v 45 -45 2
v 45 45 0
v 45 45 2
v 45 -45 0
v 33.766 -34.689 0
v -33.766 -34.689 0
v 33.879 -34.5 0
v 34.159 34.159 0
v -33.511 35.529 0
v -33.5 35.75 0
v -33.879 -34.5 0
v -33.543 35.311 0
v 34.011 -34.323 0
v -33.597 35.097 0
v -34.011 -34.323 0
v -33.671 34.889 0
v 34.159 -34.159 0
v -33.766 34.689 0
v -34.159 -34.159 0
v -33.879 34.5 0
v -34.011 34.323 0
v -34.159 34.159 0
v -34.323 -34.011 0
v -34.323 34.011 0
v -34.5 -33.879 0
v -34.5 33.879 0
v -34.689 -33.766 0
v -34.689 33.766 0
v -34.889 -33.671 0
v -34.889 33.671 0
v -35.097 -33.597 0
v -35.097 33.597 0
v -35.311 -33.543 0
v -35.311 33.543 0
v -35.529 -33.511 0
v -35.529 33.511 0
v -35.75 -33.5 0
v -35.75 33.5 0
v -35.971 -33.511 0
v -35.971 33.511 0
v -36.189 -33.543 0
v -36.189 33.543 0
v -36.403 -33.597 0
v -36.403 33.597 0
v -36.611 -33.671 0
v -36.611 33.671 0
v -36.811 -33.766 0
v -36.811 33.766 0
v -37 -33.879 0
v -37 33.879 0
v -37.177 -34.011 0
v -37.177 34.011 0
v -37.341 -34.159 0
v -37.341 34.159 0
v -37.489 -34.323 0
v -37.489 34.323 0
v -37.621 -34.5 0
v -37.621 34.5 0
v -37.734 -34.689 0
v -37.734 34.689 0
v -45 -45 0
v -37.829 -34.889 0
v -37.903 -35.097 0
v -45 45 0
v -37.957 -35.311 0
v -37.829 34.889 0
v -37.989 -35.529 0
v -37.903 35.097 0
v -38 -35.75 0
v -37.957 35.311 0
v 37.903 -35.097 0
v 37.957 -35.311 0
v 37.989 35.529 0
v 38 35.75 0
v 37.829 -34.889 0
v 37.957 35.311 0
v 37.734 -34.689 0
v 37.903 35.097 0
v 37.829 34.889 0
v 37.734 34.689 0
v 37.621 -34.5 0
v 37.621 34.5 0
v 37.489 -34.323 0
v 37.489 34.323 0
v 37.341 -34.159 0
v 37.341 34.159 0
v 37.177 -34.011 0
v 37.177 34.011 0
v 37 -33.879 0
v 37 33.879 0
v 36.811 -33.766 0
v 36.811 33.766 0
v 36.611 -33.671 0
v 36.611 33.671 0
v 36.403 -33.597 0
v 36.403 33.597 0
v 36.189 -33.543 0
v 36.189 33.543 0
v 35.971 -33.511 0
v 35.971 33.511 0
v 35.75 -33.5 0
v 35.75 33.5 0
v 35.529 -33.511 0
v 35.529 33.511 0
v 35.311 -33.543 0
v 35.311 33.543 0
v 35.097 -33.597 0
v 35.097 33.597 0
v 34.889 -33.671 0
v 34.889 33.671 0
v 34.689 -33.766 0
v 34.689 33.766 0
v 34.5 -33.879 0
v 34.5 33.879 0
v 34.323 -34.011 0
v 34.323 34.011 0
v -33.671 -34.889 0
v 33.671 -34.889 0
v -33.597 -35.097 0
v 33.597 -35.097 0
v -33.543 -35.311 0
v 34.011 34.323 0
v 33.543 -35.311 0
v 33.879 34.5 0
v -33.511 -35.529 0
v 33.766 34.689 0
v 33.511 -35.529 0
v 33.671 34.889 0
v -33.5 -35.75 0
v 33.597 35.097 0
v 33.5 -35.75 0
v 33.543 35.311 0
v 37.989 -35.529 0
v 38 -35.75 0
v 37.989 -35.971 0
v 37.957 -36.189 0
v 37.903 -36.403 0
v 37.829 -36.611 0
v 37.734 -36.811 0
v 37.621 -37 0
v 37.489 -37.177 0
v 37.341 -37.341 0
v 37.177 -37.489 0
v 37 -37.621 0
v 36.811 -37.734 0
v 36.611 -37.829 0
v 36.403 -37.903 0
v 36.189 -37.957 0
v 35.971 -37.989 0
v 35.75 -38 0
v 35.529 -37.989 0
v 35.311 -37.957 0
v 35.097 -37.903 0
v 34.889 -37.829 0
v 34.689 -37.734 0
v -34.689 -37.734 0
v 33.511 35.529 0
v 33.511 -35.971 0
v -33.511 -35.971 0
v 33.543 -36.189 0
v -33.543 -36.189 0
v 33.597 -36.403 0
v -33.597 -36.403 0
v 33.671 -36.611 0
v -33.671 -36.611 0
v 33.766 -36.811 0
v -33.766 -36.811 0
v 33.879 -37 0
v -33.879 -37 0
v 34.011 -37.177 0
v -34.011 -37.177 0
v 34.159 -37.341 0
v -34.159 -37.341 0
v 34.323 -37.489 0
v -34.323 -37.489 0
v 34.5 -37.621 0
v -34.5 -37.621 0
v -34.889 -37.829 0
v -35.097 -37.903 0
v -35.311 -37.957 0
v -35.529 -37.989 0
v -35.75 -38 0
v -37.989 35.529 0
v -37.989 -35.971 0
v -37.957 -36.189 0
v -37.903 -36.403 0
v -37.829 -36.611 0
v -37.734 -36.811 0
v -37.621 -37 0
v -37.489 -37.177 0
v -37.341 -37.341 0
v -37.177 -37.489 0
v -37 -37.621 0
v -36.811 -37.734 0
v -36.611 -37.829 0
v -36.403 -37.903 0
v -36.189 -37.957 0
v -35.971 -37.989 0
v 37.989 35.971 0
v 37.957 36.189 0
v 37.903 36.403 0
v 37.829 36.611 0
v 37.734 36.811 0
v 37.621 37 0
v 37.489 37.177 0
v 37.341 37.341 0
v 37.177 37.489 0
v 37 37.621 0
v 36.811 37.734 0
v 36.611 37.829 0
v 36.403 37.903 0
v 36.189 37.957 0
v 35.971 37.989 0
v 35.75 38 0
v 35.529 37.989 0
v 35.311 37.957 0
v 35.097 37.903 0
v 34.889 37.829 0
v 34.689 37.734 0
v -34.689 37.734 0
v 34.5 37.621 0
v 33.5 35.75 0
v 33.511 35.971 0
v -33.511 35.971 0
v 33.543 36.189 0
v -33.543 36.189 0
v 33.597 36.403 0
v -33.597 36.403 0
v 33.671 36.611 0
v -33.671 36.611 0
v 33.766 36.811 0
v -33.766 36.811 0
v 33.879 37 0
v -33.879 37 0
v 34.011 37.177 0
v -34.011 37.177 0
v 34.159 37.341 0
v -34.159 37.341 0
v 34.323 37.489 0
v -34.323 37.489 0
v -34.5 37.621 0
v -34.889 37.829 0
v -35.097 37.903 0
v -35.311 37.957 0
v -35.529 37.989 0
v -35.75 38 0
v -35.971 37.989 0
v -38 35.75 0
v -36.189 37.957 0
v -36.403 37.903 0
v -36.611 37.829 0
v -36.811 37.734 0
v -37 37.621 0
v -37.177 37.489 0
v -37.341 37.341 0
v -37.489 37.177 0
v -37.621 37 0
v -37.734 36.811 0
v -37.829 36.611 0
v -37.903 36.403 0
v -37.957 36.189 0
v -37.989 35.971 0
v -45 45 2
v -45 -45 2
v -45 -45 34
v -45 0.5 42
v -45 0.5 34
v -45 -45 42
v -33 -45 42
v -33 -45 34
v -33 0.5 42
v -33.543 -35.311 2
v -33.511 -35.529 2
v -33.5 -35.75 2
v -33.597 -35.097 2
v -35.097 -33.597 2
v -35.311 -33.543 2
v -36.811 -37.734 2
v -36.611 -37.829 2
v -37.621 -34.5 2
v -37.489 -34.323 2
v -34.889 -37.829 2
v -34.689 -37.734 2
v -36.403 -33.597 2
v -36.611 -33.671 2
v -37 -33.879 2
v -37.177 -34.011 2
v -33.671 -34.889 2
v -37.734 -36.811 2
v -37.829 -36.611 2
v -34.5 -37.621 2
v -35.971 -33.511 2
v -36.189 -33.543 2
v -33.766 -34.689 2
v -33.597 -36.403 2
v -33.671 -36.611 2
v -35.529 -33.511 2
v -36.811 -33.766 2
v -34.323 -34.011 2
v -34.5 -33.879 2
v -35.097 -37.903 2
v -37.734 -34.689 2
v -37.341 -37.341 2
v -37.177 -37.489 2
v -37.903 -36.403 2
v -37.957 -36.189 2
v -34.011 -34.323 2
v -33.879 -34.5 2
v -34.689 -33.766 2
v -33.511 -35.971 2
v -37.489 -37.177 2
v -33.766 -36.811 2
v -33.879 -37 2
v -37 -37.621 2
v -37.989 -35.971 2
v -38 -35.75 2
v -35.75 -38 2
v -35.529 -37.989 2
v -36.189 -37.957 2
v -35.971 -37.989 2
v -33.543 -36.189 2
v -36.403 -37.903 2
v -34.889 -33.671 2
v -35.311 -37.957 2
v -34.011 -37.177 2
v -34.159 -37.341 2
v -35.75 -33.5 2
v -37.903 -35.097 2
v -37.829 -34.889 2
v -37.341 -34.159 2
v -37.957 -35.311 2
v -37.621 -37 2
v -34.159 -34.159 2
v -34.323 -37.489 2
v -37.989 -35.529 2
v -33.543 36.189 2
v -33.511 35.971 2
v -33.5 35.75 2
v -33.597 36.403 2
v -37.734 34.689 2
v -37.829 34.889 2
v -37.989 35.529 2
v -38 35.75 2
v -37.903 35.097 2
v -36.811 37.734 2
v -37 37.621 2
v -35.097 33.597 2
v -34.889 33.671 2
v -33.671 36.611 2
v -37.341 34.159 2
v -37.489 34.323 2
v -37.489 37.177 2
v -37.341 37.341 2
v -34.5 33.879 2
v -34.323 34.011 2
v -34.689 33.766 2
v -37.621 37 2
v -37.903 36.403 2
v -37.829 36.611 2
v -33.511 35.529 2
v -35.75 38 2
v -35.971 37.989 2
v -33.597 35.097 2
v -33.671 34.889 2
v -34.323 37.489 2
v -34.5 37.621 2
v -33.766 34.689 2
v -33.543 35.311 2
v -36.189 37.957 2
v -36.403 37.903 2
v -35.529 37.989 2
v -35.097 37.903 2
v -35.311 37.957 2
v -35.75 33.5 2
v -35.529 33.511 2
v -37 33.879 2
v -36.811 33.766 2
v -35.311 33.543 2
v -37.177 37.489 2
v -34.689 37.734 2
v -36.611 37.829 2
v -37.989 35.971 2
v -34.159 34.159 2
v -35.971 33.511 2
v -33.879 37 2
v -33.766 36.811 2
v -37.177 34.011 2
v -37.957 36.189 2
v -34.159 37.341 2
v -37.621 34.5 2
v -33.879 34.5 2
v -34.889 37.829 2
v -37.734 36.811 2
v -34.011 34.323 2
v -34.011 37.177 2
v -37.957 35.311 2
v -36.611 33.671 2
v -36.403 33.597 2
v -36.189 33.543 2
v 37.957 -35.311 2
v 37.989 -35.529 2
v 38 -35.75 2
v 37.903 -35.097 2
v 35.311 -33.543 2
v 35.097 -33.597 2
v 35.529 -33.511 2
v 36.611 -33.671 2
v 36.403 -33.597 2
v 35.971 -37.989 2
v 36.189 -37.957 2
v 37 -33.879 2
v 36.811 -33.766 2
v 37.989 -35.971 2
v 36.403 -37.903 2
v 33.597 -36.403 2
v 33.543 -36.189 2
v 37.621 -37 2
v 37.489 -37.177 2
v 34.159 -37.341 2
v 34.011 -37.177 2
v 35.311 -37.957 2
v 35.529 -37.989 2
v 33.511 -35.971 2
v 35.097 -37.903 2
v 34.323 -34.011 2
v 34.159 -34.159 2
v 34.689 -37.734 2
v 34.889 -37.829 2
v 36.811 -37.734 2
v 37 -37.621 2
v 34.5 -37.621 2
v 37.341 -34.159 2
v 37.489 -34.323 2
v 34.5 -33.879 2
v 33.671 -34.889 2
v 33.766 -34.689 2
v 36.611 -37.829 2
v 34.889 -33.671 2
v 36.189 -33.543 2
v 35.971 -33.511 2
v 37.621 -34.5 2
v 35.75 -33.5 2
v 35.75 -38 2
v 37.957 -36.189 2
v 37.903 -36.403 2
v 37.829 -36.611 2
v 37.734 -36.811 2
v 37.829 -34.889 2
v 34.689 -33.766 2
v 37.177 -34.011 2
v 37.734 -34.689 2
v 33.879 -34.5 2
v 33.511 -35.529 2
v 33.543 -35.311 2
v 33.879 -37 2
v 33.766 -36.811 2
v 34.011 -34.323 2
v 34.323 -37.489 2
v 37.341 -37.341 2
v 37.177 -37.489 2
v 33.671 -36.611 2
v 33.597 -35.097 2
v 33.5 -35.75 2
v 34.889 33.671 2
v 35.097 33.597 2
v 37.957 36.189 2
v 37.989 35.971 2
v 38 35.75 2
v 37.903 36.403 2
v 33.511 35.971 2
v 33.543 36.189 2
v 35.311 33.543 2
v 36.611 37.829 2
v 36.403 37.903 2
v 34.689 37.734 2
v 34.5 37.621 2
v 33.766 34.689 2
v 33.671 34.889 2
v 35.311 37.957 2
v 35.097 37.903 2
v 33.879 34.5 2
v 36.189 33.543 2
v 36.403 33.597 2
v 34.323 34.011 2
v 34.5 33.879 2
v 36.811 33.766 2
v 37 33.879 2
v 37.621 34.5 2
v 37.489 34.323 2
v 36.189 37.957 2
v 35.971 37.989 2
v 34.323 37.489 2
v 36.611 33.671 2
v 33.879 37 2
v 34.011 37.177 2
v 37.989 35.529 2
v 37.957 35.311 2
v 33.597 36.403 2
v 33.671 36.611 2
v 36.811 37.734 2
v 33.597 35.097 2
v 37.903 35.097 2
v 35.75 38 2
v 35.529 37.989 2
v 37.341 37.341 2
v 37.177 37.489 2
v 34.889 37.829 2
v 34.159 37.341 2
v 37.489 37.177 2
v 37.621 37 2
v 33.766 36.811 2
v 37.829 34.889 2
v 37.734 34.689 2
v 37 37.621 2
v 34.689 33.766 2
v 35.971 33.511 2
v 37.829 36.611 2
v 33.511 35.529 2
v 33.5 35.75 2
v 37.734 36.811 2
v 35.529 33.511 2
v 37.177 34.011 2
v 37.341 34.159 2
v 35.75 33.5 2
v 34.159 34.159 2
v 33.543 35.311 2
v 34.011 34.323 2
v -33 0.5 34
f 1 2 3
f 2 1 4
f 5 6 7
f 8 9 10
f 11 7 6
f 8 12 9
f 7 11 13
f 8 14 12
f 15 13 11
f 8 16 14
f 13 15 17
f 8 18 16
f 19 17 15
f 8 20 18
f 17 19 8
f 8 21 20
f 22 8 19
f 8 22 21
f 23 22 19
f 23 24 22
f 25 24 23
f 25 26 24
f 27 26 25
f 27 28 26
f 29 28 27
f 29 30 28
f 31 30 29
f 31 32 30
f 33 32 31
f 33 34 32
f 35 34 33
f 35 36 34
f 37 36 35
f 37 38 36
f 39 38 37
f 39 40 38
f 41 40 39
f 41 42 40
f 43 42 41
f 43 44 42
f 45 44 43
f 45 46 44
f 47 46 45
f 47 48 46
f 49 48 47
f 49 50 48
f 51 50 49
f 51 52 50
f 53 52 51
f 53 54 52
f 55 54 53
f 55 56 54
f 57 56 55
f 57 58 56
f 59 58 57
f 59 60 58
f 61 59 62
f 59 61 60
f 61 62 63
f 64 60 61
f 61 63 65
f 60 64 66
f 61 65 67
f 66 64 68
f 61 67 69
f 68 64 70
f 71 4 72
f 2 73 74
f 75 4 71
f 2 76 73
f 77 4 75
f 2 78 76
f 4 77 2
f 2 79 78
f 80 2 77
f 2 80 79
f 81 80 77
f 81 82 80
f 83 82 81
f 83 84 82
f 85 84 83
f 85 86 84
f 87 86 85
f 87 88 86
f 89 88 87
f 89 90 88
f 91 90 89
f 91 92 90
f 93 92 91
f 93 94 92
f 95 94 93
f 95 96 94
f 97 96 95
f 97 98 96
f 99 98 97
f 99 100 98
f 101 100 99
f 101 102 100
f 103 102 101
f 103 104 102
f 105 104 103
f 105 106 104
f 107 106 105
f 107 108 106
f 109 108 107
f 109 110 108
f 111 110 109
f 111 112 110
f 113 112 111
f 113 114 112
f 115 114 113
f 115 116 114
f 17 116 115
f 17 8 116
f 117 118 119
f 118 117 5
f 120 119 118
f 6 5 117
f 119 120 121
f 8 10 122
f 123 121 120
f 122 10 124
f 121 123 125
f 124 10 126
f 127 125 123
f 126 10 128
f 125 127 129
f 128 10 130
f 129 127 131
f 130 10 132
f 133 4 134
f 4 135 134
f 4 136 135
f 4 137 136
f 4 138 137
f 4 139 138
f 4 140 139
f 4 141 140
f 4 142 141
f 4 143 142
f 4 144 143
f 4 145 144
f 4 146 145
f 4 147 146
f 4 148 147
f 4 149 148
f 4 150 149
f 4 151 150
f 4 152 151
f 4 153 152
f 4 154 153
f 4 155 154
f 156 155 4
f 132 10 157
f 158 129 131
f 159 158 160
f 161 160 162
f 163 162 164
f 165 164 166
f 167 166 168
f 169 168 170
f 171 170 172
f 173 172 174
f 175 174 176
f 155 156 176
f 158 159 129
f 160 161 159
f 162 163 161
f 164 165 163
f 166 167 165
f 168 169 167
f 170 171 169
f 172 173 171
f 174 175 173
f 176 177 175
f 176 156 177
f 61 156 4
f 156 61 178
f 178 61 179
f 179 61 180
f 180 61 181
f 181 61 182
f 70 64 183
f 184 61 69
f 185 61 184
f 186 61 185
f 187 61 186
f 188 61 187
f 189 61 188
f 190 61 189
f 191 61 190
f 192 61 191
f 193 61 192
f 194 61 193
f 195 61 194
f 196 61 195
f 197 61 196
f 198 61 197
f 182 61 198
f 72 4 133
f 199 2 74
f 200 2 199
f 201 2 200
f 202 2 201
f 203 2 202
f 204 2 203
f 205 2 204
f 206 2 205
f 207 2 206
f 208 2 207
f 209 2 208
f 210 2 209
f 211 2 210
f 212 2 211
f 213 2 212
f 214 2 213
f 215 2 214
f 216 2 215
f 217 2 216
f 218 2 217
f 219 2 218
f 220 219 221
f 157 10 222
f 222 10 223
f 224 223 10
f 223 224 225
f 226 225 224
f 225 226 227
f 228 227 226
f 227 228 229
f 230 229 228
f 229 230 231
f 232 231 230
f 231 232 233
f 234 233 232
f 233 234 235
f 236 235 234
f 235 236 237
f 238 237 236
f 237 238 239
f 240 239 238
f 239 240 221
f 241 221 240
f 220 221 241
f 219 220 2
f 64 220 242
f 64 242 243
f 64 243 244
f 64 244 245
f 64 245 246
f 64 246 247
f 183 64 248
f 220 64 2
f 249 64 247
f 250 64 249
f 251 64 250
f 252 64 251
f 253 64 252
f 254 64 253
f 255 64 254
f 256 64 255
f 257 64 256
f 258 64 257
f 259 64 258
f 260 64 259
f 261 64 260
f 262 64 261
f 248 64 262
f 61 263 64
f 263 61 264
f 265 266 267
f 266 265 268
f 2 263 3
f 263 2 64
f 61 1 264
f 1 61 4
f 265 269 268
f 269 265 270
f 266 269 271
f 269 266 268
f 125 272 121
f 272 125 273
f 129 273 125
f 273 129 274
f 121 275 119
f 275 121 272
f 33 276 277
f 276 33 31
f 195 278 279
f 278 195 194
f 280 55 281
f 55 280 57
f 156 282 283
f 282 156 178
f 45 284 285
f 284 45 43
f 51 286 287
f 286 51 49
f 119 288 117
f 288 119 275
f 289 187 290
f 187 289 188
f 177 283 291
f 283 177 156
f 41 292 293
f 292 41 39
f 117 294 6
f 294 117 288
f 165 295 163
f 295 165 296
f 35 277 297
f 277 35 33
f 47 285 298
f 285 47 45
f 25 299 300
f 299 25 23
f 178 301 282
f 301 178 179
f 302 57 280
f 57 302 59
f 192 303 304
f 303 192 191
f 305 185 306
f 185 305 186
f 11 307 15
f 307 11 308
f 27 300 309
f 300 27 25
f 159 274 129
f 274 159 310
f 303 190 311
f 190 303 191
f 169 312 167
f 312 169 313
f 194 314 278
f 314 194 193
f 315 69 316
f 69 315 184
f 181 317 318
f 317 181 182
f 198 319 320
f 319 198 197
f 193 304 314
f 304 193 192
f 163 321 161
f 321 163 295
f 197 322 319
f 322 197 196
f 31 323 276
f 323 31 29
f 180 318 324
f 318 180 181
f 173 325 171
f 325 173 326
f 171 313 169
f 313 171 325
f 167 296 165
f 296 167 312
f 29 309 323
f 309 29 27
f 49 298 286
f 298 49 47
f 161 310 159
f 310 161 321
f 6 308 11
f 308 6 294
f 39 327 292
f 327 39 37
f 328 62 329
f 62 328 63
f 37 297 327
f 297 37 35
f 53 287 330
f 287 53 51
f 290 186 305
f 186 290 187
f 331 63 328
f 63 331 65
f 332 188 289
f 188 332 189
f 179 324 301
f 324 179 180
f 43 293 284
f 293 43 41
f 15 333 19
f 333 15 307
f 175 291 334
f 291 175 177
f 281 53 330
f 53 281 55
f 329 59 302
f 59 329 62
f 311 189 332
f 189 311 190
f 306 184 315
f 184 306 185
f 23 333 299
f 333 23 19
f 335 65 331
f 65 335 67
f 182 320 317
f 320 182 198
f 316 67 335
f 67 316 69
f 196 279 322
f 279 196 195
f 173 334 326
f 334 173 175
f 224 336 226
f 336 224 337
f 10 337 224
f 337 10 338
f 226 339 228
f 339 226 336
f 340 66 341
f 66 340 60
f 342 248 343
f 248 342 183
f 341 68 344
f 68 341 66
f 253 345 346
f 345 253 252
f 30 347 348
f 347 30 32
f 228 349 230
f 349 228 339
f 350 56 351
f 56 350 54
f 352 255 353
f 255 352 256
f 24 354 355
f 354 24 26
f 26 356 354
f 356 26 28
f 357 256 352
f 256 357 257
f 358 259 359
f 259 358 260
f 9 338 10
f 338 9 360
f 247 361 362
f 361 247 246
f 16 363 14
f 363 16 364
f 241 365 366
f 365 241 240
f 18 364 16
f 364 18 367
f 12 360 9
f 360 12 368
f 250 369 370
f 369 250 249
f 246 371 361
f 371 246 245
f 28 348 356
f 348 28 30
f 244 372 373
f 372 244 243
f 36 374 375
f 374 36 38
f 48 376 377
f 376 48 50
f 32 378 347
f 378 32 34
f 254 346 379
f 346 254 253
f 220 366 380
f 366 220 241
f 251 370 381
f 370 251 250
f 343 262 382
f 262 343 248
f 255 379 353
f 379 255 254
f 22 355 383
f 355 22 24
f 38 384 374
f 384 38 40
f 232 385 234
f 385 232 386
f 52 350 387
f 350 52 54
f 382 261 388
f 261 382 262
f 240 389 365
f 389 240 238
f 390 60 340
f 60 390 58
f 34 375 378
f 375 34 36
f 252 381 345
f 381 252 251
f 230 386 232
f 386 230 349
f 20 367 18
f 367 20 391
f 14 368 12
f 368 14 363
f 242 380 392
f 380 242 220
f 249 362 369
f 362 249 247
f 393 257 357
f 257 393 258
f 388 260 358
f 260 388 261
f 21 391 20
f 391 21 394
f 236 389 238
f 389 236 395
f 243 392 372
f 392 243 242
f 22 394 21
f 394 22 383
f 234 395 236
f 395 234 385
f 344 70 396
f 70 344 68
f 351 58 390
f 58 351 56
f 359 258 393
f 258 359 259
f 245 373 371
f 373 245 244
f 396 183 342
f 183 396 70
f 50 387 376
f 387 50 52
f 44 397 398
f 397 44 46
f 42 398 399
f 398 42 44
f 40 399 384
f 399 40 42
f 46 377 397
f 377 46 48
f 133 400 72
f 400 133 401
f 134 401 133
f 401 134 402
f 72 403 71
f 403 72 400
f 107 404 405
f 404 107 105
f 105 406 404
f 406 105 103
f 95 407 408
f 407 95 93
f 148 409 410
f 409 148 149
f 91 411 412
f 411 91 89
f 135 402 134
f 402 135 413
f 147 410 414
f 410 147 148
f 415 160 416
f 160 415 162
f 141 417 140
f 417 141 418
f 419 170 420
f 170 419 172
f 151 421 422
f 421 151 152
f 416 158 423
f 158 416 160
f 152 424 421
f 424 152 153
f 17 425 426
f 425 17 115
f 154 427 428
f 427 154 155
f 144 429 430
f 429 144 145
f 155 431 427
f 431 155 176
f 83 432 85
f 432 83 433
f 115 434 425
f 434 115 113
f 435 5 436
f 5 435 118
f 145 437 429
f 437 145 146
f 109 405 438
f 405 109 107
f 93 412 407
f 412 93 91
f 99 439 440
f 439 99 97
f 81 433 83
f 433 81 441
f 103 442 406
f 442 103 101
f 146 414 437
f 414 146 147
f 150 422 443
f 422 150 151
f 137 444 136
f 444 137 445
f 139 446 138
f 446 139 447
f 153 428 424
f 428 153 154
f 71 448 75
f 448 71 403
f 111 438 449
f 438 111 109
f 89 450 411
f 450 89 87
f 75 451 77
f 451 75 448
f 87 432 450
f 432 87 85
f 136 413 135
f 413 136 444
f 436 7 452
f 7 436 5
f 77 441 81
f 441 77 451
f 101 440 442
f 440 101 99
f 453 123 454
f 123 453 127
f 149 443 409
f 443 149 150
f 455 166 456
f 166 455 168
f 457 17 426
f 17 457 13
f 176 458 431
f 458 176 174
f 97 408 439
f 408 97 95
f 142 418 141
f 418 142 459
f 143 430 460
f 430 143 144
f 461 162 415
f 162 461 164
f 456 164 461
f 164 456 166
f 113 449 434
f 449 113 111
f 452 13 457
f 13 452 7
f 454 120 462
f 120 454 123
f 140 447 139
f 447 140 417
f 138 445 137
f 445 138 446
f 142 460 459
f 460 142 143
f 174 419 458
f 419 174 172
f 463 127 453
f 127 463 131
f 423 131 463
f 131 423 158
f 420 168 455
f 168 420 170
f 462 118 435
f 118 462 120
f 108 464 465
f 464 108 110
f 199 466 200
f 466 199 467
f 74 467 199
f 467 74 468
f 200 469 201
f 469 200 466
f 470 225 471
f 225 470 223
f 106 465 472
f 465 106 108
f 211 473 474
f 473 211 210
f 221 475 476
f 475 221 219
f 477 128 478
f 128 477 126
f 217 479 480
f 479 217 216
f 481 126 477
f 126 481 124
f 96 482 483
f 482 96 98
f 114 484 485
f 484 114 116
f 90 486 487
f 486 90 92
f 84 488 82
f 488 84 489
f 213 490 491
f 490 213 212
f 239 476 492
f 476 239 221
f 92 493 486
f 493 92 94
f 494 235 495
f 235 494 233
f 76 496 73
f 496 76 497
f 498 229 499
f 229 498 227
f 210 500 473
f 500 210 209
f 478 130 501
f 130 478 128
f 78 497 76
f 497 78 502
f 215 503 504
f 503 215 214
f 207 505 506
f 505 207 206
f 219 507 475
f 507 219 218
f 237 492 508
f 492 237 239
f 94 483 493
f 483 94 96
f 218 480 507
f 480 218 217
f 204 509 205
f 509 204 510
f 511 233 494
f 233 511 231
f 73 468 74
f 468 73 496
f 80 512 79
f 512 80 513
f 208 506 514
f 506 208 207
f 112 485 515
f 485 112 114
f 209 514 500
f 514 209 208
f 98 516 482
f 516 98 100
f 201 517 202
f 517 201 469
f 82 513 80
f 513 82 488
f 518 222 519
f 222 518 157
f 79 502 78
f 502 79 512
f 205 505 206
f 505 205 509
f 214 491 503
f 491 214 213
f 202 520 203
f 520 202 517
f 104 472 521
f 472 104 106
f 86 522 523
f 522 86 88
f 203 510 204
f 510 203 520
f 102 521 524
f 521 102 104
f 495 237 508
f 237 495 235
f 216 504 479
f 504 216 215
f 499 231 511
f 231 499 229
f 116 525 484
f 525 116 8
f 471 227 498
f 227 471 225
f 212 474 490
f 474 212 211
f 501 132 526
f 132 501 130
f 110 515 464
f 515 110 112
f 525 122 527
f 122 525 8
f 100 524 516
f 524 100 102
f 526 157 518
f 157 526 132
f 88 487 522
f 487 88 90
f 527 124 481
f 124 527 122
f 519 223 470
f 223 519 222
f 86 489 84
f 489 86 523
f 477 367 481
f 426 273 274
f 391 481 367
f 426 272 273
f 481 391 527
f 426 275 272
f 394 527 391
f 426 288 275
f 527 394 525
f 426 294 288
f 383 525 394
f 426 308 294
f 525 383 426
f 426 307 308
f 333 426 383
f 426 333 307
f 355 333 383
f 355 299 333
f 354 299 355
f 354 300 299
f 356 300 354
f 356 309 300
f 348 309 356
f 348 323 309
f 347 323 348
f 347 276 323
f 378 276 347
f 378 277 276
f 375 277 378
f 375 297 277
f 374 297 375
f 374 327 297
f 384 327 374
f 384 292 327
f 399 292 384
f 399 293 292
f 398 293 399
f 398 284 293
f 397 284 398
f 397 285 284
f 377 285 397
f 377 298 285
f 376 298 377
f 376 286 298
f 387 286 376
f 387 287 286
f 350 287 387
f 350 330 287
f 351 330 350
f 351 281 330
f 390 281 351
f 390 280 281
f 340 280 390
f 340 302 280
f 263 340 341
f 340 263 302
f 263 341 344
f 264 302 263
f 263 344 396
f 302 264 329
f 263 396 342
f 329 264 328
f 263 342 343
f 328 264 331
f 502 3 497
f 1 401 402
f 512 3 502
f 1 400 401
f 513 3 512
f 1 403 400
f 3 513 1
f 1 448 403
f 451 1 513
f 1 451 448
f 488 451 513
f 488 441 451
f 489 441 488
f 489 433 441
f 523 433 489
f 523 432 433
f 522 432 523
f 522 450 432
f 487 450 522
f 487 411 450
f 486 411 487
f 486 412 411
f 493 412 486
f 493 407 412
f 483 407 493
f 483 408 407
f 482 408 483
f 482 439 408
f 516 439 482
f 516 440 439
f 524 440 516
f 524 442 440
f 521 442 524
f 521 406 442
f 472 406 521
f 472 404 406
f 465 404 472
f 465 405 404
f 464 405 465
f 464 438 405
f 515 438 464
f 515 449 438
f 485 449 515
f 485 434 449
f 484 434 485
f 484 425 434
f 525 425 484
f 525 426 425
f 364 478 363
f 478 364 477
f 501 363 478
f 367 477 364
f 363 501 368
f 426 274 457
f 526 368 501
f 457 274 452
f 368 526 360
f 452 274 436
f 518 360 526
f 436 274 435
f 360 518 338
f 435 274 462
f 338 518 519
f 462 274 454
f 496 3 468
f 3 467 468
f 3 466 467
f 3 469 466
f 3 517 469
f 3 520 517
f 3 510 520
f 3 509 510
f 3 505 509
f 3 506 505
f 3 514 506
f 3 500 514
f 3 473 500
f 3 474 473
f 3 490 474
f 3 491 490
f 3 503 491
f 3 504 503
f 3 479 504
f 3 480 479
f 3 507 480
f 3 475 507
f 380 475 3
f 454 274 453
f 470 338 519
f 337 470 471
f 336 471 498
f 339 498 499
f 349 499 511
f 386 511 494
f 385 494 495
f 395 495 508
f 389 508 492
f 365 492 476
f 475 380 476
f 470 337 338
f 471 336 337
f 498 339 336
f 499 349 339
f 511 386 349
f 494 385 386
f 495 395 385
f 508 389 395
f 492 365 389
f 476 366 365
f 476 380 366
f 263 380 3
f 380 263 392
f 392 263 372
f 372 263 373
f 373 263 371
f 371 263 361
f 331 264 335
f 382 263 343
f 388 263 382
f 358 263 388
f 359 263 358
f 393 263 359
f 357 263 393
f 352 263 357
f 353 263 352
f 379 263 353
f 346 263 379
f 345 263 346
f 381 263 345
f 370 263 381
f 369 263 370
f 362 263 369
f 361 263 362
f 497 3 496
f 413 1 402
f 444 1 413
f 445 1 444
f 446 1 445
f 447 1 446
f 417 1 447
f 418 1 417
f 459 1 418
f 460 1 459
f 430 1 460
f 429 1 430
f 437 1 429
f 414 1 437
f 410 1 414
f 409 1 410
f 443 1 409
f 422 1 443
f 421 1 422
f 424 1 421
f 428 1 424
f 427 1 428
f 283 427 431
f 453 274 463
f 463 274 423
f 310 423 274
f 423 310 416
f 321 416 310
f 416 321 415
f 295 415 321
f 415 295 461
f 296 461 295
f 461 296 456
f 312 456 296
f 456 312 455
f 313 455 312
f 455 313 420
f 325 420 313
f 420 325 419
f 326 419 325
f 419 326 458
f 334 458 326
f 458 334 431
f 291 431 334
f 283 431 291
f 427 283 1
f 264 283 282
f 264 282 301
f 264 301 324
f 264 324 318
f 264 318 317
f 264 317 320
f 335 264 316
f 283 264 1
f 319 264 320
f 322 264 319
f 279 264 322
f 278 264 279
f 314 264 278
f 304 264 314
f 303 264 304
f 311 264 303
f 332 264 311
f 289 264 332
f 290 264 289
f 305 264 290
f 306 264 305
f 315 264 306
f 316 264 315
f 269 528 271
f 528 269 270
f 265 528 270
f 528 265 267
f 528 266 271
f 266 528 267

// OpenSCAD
// Magnetic stirrer housing - upside-down open box over PC fan
// Print orientation: top plate on bed (z = 0), walls rise to z = 40

// ---- Dimensions (mm) ----
plate_t      = 2;     // top plate thickness
wall_t       = 2.5;   // wall thickness
box_h        = 40;    // total height from plate top to open top
outer_x      = 90;    // outer size in X
outer_y      = 90;    // outer size in Y
hole_d       = 4.5;   // M4 screw hole diameter
hole_n       = 4;     // number of screw holes
hole_pitch   = 71.5;  // square hole pattern side length
notch_w      = 12;    // cable notch width
notch_d      = 8;     // cable notch depth from open edge
eps          = 0.5;   // cutter overshoot past faces

$fn = 64;

// ---- Model ----
difference() {
    // Closed top plate, open box below (overlapping slightly at seam)
    union() {
        translate([-outer_x/2, -outer_y/2, 0])
            cube([outer_x, outer_y, plate_t]);
        translate([-outer_x/2, -outer_y/2, plate_t - eps])
            cube([outer_x, outer_y, box_h + eps]);
    }

    // Screw holes through top plate, centred on plate
    for (i = [0 : hole_n - 1])
        for (j = [0 : hole_n - 1]) {
            x = (i - (hole_n - 1)/2) * hole_pitch;
            y = (j - (hole_n - 1)/2) * hole_pitch;
            translate([x, y, -eps])
                cylinder(d = hole_d, h = plate_t + 2*eps);
        }

    // Cable notch in one wall, centred along wall, open at top
    translate([-outer_x/2, -outer_y/2, plate_t])
        difference() {
            cube([outer_x, outer_y, box_h]);
            translate([0, -outer_y/2 - eps, box_h - notch_d])
                cube([notch_w, outer_y + 2*eps, notch_d]);
        }
}
